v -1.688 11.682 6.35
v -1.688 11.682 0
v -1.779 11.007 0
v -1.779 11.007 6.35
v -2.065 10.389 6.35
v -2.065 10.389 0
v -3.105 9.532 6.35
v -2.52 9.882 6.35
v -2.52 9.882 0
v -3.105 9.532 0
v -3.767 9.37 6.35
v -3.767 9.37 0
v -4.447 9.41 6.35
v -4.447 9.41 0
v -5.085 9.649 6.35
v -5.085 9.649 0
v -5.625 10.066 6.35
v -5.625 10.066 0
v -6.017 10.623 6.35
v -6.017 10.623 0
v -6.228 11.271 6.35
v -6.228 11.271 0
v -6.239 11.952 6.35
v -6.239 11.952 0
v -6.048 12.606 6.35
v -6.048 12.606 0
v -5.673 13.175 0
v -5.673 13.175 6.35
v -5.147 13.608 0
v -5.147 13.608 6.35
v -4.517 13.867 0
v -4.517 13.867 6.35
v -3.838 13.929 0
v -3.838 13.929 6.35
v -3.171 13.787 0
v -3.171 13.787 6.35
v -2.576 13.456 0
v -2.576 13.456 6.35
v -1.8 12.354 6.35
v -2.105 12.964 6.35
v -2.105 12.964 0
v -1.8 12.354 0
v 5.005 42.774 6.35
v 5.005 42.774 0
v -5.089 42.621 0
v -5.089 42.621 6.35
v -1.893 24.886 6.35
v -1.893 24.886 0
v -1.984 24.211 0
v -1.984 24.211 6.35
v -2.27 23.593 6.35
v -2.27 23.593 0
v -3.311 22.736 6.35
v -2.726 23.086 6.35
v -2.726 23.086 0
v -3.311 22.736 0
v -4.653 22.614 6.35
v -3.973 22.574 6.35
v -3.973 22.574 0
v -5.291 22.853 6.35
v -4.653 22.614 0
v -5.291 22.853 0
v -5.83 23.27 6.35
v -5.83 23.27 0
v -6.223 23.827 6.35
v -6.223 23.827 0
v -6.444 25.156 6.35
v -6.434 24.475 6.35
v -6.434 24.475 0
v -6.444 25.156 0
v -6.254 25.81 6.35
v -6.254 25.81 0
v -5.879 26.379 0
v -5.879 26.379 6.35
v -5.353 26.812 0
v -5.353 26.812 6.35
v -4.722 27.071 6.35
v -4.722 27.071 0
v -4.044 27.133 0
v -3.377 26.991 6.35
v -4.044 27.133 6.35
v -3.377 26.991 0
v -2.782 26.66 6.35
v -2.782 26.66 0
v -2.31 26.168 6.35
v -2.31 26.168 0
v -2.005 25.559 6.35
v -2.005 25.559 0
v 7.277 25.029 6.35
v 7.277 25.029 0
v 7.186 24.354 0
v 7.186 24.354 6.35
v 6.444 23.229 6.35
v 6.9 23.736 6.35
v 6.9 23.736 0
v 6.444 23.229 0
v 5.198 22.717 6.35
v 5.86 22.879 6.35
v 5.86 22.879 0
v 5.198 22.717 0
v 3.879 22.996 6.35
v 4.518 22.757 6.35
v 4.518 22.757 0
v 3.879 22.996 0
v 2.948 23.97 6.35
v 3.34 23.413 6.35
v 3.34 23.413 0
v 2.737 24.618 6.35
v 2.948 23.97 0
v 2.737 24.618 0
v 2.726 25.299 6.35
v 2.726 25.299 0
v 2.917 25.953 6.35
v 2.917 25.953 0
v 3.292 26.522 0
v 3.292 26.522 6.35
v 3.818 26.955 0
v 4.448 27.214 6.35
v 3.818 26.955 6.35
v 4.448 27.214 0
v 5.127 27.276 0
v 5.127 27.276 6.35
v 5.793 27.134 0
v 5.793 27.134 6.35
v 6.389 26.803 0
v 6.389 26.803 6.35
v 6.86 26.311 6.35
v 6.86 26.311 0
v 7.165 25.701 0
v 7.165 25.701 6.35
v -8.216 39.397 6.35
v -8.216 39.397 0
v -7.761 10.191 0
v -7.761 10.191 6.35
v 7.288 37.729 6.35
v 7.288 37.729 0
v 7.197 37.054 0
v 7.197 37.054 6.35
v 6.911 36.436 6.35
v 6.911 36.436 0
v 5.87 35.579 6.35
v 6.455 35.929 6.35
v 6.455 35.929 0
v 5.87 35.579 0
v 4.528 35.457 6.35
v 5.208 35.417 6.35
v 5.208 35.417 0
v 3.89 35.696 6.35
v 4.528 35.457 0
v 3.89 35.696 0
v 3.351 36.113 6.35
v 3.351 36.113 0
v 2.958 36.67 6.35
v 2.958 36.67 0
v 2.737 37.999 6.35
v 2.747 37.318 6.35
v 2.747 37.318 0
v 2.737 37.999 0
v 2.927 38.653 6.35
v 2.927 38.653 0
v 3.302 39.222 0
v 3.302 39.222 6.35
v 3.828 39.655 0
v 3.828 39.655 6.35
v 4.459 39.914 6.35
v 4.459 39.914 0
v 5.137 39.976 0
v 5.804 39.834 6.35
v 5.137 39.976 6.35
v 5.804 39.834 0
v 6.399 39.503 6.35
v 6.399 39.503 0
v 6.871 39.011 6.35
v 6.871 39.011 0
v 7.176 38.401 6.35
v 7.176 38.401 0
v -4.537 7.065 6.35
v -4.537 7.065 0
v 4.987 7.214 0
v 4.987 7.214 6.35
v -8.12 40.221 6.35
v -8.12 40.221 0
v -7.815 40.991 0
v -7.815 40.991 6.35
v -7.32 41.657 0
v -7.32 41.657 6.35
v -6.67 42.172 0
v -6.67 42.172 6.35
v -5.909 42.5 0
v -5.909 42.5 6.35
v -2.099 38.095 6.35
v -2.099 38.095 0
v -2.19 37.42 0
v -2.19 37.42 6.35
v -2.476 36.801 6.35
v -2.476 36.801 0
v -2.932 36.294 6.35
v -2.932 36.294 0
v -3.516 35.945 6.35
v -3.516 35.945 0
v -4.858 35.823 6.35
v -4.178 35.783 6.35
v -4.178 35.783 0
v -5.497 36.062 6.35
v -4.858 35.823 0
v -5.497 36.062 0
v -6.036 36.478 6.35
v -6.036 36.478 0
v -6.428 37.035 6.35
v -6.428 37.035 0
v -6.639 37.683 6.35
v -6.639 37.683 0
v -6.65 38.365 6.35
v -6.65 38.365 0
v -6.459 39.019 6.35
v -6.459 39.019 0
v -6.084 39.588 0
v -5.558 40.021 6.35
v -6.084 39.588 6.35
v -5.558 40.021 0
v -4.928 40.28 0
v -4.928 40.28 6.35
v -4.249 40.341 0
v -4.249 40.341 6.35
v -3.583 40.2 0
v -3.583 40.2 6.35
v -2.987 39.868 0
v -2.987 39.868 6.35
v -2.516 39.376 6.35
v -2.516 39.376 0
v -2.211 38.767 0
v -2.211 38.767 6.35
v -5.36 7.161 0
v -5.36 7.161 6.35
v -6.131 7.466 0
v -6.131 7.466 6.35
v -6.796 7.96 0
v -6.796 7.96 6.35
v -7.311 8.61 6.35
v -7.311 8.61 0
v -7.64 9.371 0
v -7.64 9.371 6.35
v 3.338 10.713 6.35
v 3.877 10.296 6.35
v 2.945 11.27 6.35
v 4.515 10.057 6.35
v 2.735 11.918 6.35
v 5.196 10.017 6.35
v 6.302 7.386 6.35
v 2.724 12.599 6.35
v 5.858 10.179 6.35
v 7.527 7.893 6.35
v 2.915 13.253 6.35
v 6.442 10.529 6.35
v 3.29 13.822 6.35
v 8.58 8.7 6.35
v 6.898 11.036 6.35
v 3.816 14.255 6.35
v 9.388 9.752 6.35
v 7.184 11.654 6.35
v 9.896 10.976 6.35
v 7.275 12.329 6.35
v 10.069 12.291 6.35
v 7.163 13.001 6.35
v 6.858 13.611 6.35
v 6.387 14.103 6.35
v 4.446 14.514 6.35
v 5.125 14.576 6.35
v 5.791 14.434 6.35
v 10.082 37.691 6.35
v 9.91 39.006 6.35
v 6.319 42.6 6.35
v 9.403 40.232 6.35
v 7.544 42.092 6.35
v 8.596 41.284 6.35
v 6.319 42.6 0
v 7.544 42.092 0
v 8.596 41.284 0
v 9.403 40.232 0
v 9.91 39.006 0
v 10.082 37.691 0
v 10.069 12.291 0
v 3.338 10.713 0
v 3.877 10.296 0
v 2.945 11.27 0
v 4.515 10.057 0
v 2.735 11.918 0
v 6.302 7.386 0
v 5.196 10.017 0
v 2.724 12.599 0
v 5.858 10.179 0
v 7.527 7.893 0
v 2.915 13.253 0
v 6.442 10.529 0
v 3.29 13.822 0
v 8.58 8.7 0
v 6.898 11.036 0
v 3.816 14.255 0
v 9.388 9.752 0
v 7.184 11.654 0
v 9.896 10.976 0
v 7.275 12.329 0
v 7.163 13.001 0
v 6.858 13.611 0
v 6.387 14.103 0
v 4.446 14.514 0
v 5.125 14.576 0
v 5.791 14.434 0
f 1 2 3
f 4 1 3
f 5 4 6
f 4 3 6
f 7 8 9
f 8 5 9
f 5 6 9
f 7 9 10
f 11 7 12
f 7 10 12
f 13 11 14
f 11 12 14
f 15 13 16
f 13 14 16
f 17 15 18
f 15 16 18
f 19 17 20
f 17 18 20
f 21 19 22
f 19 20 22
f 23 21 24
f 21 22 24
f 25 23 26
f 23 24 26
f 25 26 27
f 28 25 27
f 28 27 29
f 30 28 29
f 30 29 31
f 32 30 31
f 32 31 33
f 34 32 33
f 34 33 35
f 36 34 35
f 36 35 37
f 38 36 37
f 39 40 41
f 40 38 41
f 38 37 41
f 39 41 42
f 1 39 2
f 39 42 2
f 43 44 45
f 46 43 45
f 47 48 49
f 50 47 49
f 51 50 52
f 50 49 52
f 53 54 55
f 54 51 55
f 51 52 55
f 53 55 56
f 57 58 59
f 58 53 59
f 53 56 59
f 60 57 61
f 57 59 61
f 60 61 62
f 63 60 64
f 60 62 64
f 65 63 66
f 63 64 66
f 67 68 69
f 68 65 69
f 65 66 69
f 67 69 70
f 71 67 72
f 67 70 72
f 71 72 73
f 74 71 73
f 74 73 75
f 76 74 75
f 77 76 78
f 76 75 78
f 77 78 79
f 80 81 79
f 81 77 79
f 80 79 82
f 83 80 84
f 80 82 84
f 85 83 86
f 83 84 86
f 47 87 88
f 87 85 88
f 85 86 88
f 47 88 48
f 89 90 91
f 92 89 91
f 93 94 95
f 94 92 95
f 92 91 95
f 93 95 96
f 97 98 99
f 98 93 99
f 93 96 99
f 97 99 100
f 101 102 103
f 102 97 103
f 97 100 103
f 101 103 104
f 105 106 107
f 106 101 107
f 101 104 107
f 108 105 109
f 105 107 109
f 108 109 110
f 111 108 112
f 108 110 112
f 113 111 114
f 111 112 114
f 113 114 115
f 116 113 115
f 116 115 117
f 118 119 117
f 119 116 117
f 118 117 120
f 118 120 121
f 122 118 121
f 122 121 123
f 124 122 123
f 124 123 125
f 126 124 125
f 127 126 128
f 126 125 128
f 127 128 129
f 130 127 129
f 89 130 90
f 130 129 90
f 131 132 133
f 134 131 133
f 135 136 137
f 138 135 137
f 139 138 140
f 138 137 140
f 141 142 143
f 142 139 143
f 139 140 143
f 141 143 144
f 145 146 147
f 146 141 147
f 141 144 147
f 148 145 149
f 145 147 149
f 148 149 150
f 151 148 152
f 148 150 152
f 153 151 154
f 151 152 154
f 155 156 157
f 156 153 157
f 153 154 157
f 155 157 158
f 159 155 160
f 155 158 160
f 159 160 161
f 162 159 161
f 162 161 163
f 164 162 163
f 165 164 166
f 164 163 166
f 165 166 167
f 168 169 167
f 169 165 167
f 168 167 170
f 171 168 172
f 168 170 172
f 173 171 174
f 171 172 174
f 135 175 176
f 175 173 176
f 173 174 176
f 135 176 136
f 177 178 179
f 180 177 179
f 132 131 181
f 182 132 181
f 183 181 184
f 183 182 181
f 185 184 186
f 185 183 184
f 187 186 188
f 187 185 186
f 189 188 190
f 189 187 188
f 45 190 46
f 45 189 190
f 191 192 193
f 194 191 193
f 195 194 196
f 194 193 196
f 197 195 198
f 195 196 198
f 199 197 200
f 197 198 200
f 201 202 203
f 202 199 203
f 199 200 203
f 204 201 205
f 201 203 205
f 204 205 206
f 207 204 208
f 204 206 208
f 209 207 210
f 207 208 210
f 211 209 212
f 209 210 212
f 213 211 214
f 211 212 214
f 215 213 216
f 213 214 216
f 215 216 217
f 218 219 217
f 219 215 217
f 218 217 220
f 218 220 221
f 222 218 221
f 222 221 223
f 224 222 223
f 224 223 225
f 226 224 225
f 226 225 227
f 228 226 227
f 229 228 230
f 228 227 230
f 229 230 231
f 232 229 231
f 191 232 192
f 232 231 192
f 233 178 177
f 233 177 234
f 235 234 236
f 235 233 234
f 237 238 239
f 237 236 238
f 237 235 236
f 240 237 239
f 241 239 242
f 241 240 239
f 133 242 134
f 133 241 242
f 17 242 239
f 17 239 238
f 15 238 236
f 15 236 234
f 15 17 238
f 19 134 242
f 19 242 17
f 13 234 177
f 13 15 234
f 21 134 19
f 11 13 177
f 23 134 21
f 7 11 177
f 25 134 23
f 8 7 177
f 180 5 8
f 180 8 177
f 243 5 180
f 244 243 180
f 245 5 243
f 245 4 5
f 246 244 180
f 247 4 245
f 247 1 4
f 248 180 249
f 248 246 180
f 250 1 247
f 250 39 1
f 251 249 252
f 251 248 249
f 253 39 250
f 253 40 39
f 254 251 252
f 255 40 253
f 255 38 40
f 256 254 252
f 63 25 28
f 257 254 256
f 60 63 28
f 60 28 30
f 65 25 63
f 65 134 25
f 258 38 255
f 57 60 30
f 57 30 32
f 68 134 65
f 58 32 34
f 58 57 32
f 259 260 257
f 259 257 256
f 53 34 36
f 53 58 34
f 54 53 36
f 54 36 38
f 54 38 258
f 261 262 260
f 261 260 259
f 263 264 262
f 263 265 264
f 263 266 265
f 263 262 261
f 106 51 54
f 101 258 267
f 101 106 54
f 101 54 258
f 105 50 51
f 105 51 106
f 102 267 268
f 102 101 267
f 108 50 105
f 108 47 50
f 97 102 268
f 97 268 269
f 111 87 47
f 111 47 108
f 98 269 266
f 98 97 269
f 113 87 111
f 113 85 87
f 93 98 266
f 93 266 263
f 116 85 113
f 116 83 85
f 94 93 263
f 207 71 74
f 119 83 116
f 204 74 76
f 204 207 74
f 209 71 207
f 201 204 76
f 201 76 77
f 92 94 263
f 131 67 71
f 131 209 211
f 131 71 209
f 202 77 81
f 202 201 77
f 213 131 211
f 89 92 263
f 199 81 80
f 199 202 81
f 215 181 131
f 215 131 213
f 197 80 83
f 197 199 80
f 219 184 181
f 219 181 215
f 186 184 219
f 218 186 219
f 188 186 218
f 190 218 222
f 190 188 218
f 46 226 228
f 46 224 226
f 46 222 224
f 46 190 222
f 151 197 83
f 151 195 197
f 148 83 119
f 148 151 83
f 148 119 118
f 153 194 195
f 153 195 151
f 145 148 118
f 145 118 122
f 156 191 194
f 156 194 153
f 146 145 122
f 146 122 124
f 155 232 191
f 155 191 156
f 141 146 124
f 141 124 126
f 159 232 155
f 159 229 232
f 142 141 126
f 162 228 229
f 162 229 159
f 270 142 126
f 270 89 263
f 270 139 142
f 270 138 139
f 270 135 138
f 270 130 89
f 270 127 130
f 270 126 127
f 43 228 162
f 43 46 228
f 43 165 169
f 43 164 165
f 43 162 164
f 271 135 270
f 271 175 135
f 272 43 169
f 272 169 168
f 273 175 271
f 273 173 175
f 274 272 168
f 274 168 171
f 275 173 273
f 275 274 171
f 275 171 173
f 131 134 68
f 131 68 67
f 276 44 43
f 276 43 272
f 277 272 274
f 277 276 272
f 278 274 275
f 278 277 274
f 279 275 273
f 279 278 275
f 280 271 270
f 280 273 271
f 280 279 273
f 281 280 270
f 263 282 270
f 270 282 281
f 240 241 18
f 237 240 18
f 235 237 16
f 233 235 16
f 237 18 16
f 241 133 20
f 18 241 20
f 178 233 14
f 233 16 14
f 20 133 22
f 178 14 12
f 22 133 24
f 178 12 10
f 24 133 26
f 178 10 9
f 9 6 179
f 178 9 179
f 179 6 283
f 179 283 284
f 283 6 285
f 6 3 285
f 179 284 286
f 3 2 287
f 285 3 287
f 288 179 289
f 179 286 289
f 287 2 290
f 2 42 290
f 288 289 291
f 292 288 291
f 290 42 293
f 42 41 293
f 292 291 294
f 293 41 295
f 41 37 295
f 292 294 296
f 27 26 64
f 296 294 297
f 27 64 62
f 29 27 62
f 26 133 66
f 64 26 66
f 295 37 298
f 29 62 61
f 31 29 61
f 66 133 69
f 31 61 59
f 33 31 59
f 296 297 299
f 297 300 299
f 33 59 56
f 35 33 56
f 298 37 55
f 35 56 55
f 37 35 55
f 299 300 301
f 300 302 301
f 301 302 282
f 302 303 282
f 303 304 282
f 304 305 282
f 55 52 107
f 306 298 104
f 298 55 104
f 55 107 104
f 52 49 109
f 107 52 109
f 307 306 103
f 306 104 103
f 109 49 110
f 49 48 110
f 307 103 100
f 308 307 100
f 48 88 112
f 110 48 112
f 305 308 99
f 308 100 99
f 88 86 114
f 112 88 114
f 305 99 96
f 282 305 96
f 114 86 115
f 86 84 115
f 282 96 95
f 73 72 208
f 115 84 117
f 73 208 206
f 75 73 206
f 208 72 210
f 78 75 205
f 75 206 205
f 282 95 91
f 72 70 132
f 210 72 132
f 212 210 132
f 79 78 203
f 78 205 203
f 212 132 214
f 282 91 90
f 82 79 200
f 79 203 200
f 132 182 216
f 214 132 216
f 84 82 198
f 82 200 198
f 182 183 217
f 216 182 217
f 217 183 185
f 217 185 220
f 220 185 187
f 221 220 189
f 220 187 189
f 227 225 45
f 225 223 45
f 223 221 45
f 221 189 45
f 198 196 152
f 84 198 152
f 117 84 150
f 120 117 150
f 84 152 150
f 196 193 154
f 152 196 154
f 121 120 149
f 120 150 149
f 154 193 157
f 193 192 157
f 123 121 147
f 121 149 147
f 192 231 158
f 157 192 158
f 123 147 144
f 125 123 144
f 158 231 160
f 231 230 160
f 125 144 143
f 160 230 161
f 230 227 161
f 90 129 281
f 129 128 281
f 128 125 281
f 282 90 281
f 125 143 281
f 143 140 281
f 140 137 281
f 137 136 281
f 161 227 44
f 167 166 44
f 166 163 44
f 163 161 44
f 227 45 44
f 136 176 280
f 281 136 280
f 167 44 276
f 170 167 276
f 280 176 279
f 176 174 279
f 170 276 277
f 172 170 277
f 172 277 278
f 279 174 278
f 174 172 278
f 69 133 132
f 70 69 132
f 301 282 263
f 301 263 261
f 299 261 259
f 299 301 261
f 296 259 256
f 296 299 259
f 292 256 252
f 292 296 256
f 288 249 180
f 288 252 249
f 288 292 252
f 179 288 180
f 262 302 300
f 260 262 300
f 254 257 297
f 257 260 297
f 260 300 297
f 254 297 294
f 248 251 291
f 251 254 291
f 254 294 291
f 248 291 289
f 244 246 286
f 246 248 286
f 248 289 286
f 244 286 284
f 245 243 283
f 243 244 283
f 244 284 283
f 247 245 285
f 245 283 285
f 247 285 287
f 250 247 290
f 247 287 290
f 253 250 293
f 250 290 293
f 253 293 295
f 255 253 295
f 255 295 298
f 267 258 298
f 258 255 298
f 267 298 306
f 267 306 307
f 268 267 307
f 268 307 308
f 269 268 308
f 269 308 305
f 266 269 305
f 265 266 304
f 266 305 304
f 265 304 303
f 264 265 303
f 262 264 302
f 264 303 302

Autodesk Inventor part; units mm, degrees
ref_plane "YZ Plane" through (0, 0, 0) normal (1, 0, 0) x (0, 1, 0)
ref_plane "XZ Plane" through (0, 0, 0) normal (0, 1, 0) x (-1, 0, 0)
ref_plane "Work Plane1" through (0.394452, -0.667998, 0) normal (0, 0, 1) x (0.9998788, 0.0155691, 0)
sketch "Sketch1" plane through (0.394452, -0.667998, 0) normal (0, 0, 1) x (0.9998788, 0.0155691, 0)
  circle A0 centre (5.204347, 38.285312) radius 1.27
  circle A1 centre (5.004519, 25.586884) radius 1.27
  circle A2 centre (4.796193, 12.888588) radius 1.27
  line L0 (5.002396, 38.285413) -> (4.989697, 12.888491) construction
  line L1 (0.125003, 38.366943) -> (-0.283151, 12.970219)
  line L2 (9.875538, 12.806957) -> (10.283691, 38.203681)
  arc A3 (10.283691, 38.203681) -> (0.125003, 38.366943) centre (5.204347, 38.285312) ccw
  arc A4 (-0.283151, 12.970219) -> (9.875538, 12.806957) centre (4.796193, 12.888588) ccw
  circle A5 centre (4.796193, 12.888588) radius 2.286
  circle A6 centre (4.996047, 25.587018) radius 2.286
  circle A7 centre (5.204347, 38.285312) radius 2.286
  line L3 (4.714563, 7.809244) -> (-4.810437, 7.809244)
  line L4 (-7.985437, 10.984244) -> (-7.985437, 40.194244)
  line L5 (-4.808994, 43.369244) -> (5.285978, 43.364656)
  arc A8 (-7.985437, 10.984244) -> (-4.810437, 7.809244) centre (-4.810437, 10.984244) ccw
  arc A9 (-4.808994, 43.369244) -> (-7.985437, 40.194244) centre (-4.810437, 40.194244) ccw
  circle A10 centre (-4.175437, 12.381244) radius 2.286
  circle A11 centre (-4.175437, 25.586884) radius 2.286
  circle A12 centre (-4.175437, 38.796956) radius 2.286
  point P0 (-0.384004, 0.674059)
  point P1 (-7.985437, 7.809244)
  dimension "d0" = 10.16
  dimension "d1" = 4.572
  dimension "d2" = 4.572
  dimension "d3" = 4.572
  dimension "d4" = 12.7
  dimension "d6" = 3.175
  dimension "d7" = 3.175
  dimension "d8" = 35.56
  dimension "d18" = 3.81
  dimension "d19" = 4.572
  dimension "d20" = 4.572
  dimension "d21" = 4.572
sketch "Sketch1 outline for Extrusion1" plane through (0.394452, -0.667998, 0) normal (0, 0, 1) x (0.9998788, 0.0155691, 0)
  line L0 (5.285978, 43.364656) -> (-4.808994, 43.369244)
  arc A0 (10.283691, 38.203681) -> (5.285978, 43.364656) centre (5.204347, 38.285312) ccw
  arc A1 (-4.808994, 43.369244) -> (-7.985437, 40.194244) centre (-4.810437, 40.194244) ccw
  line L1 (9.875538, 12.806957) -> (10.283691, 38.203681)
  line L2 (-7.985437, 40.194244) -> (-7.985437, 10.984244)
  arc A2 (4.714563, 7.809244) -> (9.875538, 12.806957) centre (4.796193, 12.888588) ccw
  arc A3 (-7.985437, 10.984244) -> (-4.810437, 7.809244) centre (-4.810437, 10.984244) ccw
  line L3 (-4.810437, 7.809244) -> (4.714563, 7.809244)
  circle A4 centre (-4.175437, 12.381244) radius 2.286
  circle A5 centre (-4.175437, 25.586884) radius 2.286
  circle A6 centre (4.796193, 12.888588) radius 2.286
  circle A7 centre (4.996047, 25.587018) radius 2.286
  circle A8 centre (-4.175437, 38.796956) radius 2.286
  circle A9 centre (5.204347, 38.285312) radius 2.286
extrude "Extrusion1" add sketch "Sketch1 outline for Extrusion1" along normal blind 6.35
properties part number "OdomPods" material "Plastic, Opaque Black"
